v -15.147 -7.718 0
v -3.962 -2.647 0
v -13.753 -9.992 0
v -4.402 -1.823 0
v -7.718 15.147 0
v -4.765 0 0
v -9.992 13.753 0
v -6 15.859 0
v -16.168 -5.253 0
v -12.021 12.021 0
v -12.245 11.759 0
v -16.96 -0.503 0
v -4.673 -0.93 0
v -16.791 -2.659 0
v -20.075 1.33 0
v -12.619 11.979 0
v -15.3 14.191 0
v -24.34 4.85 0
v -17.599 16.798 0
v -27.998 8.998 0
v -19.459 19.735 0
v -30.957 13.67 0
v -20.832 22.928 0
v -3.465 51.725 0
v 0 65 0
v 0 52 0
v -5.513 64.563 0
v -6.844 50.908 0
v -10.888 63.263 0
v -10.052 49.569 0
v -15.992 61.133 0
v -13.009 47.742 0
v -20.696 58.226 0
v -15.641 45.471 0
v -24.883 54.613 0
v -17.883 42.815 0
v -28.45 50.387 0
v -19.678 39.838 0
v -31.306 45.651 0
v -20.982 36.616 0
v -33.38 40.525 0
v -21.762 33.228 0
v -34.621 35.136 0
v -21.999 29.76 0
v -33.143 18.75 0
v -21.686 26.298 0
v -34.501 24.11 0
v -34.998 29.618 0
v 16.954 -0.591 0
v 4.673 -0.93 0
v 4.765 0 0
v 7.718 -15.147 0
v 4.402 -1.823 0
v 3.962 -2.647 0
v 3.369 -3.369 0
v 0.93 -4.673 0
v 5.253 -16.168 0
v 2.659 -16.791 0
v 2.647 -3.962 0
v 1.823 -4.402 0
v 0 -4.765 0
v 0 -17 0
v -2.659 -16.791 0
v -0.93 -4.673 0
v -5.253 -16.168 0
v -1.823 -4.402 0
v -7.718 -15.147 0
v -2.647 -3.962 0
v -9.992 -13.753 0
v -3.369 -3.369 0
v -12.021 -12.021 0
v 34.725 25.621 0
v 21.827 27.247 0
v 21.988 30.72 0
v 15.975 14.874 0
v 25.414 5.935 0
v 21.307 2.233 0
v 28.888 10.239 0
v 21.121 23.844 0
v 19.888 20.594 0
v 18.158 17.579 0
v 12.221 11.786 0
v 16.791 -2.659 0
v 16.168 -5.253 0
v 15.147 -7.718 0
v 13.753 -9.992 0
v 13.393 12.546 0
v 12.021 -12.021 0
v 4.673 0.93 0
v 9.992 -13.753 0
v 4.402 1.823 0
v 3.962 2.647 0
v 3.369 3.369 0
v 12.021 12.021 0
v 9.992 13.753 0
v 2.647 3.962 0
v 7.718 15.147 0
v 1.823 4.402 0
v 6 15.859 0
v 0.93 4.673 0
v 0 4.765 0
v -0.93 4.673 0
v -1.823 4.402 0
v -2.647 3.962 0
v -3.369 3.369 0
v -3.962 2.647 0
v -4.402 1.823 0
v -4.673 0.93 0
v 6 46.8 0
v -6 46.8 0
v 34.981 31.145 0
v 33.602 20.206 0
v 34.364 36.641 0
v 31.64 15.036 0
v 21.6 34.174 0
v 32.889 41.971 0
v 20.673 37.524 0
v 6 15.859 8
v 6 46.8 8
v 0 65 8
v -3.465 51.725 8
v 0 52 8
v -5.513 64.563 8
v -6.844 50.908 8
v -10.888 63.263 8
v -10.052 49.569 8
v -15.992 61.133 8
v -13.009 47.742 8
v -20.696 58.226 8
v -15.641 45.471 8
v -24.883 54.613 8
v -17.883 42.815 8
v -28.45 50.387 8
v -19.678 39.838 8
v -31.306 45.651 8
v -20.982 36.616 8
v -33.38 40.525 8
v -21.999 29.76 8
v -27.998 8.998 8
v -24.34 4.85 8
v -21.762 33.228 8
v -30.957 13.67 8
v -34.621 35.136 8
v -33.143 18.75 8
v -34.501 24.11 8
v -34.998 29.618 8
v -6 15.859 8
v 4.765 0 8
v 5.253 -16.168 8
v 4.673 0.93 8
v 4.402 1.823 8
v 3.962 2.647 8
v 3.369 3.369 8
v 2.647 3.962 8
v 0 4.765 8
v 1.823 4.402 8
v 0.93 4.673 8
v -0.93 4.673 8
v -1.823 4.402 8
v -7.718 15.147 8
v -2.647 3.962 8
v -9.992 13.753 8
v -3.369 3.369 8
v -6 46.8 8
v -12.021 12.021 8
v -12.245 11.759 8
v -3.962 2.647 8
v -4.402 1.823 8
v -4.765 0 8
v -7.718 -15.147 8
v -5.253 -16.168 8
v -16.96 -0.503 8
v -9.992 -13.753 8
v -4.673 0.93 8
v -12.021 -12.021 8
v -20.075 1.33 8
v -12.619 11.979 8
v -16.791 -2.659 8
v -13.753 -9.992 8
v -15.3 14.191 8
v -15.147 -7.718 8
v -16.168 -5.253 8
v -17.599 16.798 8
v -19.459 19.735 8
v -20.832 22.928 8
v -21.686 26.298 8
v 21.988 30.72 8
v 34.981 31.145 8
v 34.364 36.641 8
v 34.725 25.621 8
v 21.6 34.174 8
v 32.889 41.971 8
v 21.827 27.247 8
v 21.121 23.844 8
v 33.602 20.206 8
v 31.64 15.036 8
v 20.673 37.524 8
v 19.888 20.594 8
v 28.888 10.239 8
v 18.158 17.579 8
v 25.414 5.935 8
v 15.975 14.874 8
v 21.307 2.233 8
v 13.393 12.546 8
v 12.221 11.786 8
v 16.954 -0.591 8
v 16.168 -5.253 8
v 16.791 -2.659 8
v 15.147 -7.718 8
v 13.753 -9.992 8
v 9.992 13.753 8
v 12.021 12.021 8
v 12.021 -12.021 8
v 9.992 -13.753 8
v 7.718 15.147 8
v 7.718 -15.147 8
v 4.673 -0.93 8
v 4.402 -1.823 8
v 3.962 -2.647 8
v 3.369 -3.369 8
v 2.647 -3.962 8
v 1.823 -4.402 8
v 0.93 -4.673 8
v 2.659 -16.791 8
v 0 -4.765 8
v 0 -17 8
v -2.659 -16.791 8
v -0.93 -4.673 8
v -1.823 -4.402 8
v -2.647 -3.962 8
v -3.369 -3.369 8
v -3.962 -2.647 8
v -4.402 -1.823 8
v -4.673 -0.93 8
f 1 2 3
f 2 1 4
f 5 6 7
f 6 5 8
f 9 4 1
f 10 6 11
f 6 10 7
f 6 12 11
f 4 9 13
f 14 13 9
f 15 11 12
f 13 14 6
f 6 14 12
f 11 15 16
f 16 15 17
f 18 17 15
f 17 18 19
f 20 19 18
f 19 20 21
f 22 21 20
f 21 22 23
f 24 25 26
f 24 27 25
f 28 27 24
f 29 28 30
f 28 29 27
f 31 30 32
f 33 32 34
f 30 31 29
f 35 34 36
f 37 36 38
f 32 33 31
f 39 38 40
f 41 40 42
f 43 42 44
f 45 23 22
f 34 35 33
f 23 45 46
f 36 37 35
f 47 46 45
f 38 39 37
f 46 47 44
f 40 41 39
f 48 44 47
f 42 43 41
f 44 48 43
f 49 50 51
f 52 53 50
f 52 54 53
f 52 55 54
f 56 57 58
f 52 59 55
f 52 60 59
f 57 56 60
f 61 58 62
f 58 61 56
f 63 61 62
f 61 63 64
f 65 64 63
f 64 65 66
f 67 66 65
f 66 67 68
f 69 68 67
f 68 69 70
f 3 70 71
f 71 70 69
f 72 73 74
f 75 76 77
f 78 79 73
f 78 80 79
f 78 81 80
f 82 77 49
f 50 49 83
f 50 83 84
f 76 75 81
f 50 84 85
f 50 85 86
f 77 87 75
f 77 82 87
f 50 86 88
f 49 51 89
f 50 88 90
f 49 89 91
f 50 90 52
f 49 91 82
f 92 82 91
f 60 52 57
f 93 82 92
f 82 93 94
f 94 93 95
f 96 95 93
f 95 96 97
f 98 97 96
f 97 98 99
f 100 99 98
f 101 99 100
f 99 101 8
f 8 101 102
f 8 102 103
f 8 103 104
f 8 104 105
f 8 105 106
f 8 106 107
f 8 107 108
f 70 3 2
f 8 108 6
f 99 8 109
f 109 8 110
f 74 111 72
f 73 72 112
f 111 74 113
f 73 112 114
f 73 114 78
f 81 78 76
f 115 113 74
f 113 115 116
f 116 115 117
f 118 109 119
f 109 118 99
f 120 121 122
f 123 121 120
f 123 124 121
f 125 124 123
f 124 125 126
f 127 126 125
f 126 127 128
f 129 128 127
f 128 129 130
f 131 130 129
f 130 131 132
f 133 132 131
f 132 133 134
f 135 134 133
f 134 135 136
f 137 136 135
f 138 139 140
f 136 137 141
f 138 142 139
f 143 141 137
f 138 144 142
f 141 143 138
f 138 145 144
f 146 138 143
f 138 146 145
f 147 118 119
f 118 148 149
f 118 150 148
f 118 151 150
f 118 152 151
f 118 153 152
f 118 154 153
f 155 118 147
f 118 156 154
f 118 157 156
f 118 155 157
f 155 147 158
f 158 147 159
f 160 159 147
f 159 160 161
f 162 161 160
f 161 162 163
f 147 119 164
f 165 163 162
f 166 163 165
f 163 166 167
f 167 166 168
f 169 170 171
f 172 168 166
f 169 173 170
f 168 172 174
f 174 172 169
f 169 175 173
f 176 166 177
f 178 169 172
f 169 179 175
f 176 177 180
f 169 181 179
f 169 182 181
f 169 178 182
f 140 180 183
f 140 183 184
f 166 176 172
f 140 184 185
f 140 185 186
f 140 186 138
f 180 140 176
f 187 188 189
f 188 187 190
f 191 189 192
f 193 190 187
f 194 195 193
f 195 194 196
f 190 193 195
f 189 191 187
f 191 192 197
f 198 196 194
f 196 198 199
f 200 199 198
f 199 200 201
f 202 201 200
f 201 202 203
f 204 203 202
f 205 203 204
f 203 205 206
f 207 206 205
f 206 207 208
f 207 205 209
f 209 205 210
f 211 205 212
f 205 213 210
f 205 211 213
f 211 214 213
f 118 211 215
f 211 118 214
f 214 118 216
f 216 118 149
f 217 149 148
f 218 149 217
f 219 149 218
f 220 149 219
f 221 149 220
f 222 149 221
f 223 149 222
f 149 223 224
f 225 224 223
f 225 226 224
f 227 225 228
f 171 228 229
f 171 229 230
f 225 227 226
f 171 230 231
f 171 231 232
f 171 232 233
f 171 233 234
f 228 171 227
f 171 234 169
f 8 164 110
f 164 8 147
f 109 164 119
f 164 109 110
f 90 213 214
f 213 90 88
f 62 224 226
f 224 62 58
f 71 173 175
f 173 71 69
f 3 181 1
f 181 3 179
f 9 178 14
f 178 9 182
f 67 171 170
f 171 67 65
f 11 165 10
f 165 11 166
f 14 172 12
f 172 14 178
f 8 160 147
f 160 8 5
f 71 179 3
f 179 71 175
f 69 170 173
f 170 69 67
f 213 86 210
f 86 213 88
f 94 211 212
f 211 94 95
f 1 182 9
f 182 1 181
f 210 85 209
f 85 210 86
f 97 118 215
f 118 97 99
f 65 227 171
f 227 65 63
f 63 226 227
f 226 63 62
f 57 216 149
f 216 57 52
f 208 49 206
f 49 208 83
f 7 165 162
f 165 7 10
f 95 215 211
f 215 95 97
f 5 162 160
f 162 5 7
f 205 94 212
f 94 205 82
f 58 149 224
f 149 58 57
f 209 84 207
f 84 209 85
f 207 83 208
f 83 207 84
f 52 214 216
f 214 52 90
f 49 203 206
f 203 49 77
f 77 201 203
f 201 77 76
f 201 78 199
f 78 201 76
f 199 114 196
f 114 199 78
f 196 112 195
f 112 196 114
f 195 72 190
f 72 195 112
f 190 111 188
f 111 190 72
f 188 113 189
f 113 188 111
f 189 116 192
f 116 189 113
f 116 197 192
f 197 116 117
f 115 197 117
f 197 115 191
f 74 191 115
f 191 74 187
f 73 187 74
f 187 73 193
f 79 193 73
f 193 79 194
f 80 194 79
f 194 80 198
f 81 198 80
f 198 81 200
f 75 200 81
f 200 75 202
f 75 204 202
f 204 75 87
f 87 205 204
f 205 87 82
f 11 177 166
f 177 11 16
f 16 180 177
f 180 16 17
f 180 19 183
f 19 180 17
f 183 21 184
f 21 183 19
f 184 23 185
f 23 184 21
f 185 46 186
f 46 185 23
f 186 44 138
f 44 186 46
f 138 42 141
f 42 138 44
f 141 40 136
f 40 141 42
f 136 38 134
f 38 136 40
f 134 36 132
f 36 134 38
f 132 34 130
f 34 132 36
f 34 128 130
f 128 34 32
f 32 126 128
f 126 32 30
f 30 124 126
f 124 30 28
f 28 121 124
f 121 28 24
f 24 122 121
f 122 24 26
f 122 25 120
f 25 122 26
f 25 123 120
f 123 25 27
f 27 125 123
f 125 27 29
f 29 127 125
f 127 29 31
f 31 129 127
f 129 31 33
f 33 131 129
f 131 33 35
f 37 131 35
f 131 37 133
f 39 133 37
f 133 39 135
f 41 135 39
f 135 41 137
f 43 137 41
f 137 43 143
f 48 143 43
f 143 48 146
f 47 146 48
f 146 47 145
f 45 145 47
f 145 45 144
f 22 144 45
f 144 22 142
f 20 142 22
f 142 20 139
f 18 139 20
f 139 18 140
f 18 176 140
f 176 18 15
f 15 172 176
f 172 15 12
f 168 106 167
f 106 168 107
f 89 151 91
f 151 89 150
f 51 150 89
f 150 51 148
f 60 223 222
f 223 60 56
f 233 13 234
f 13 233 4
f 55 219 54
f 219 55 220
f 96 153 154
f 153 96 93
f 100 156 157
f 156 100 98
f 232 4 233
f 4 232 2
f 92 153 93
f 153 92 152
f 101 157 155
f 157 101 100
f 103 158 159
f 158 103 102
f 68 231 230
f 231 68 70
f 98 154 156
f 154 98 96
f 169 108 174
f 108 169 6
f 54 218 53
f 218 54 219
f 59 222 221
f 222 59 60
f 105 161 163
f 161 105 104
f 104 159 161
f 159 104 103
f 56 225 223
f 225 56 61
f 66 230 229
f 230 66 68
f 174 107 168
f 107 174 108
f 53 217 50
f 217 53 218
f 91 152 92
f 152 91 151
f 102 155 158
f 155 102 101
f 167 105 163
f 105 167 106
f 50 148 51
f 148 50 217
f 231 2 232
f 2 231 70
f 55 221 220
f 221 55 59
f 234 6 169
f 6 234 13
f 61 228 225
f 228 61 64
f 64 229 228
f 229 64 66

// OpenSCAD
$fn = 32;

// ----------------------------------------------------------------------
// Hook: 60 mm shank into a 22 mm curl, 8 mm thick
// ----------------------------------------------------------------------

// --- parameters (mm) ---
shank_len = 60;           // shank length from the boss centre
shank_w = 12;             // shank width
boss_d = 34;              // boss diameter
bore_d = 9.53;            // boss bore
curl_in = 22;             // curl inner radius
curl_out = 35;            // curl outer radius
curl_sweep = 290;         // curl sweep angle
hook_t = 8;               // hook thickness

shank_profile = [[-6, 46.8], [6, 46.8], [6, 15], [-6, 15]];
boss_profile = [[17, 0], [16.791, 2.659], [16.168, 5.253], [15.147, 7.718], [13.753, 9.992], [12.021, 12.021], [9.992, 13.753], [7.718, 15.147], [5.253, 16.168], [2.659, 16.791], [0, 17], [-2.659, 16.791], [-5.253, 16.168], [-7.718, 15.147], [-9.992, 13.753], [-12.021, 12.021], [-13.753, 9.992], [-15.147, 7.718], [-16.168, 5.253], [-16.791, 2.659], [-17, 0], [-16.791, -2.659], [-16.168, -5.253], [-15.147, -7.718], [-13.753, -9.992], [-12.021, -12.021], [-9.992, -13.753], [-7.718, -15.147], [-5.253, -16.168], [-2.659, -16.791], [0, -17], [2.659, -16.791], [5.253, -16.168], [7.718, -15.147], [9.992, -13.753], [12.021, -12.021], [13.753, -9.992], [15.147, -7.718], [16.168, -5.253], [16.791, -2.659]];
curl_profile = [[0, 65], [-5.513, 64.563], [-10.888, 63.263], [-15.992, 61.133], [-20.696, 58.226], [-24.883, 54.613], [-28.45, 50.387], [-31.306, 45.651], [-33.38, 40.525], [-34.621, 35.136], [-34.998, 29.618], [-34.501, 24.11], [-33.143, 18.75], [-30.957, 13.67], [-27.998, 8.998], [-24.34, 4.85], [-20.075, 1.33], [-15.309, -1.475], [-10.16, -3.493], [-4.758, -4.675], [0.764, -4.992], [6.266, -4.435], [11.611, -3.018], [16.667, -0.777], [21.307, 2.233], [25.414, 5.935], [28.888, 10.239], [31.64, 15.036], [33.602, 20.206], [34.725, 25.621], [34.981, 31.145], [34.364, 36.641], [32.889, 41.971], [20.673, 37.524], [21.6, 34.174], [21.988, 30.72], [21.827, 27.247], [21.121, 23.844], [19.888, 20.594], [18.158, 17.579], [15.975, 14.874], [13.393, 12.546], [10.476, 10.655], [7.298, 9.246], [3.938, 8.355], [0.48, 8.005], [-2.99, 8.204], [-6.386, 8.947], [-9.623, 10.216], [-12.619, 11.979], [-15.3, 14.191], [-17.599, 16.798], [-19.459, 19.735], [-20.832, 22.928], [-21.686, 26.298], [-21.999, 29.76], [-21.762, 33.228], [-20.982, 36.616], [-19.678, 39.838], [-17.883, 42.815], [-15.641, 45.471], [-13.009, 47.742], [-10.052, 49.569], [-6.844, 50.908], [-3.465, 51.725], [0, 52]];

difference() {
  union() {
    /* three overlapping outlines: shank, boss and the smooth curl */
    linear_extrude(height = hook_t) polygon(shank_profile);
    linear_extrude(height = hook_t) polygon(boss_profile);
    linear_extrude(height = hook_t) polygon(curl_profile);
  }
  translate([0, 0, -2.5]) cylinder(h = hook_t + 5, d = bore_d);
}
